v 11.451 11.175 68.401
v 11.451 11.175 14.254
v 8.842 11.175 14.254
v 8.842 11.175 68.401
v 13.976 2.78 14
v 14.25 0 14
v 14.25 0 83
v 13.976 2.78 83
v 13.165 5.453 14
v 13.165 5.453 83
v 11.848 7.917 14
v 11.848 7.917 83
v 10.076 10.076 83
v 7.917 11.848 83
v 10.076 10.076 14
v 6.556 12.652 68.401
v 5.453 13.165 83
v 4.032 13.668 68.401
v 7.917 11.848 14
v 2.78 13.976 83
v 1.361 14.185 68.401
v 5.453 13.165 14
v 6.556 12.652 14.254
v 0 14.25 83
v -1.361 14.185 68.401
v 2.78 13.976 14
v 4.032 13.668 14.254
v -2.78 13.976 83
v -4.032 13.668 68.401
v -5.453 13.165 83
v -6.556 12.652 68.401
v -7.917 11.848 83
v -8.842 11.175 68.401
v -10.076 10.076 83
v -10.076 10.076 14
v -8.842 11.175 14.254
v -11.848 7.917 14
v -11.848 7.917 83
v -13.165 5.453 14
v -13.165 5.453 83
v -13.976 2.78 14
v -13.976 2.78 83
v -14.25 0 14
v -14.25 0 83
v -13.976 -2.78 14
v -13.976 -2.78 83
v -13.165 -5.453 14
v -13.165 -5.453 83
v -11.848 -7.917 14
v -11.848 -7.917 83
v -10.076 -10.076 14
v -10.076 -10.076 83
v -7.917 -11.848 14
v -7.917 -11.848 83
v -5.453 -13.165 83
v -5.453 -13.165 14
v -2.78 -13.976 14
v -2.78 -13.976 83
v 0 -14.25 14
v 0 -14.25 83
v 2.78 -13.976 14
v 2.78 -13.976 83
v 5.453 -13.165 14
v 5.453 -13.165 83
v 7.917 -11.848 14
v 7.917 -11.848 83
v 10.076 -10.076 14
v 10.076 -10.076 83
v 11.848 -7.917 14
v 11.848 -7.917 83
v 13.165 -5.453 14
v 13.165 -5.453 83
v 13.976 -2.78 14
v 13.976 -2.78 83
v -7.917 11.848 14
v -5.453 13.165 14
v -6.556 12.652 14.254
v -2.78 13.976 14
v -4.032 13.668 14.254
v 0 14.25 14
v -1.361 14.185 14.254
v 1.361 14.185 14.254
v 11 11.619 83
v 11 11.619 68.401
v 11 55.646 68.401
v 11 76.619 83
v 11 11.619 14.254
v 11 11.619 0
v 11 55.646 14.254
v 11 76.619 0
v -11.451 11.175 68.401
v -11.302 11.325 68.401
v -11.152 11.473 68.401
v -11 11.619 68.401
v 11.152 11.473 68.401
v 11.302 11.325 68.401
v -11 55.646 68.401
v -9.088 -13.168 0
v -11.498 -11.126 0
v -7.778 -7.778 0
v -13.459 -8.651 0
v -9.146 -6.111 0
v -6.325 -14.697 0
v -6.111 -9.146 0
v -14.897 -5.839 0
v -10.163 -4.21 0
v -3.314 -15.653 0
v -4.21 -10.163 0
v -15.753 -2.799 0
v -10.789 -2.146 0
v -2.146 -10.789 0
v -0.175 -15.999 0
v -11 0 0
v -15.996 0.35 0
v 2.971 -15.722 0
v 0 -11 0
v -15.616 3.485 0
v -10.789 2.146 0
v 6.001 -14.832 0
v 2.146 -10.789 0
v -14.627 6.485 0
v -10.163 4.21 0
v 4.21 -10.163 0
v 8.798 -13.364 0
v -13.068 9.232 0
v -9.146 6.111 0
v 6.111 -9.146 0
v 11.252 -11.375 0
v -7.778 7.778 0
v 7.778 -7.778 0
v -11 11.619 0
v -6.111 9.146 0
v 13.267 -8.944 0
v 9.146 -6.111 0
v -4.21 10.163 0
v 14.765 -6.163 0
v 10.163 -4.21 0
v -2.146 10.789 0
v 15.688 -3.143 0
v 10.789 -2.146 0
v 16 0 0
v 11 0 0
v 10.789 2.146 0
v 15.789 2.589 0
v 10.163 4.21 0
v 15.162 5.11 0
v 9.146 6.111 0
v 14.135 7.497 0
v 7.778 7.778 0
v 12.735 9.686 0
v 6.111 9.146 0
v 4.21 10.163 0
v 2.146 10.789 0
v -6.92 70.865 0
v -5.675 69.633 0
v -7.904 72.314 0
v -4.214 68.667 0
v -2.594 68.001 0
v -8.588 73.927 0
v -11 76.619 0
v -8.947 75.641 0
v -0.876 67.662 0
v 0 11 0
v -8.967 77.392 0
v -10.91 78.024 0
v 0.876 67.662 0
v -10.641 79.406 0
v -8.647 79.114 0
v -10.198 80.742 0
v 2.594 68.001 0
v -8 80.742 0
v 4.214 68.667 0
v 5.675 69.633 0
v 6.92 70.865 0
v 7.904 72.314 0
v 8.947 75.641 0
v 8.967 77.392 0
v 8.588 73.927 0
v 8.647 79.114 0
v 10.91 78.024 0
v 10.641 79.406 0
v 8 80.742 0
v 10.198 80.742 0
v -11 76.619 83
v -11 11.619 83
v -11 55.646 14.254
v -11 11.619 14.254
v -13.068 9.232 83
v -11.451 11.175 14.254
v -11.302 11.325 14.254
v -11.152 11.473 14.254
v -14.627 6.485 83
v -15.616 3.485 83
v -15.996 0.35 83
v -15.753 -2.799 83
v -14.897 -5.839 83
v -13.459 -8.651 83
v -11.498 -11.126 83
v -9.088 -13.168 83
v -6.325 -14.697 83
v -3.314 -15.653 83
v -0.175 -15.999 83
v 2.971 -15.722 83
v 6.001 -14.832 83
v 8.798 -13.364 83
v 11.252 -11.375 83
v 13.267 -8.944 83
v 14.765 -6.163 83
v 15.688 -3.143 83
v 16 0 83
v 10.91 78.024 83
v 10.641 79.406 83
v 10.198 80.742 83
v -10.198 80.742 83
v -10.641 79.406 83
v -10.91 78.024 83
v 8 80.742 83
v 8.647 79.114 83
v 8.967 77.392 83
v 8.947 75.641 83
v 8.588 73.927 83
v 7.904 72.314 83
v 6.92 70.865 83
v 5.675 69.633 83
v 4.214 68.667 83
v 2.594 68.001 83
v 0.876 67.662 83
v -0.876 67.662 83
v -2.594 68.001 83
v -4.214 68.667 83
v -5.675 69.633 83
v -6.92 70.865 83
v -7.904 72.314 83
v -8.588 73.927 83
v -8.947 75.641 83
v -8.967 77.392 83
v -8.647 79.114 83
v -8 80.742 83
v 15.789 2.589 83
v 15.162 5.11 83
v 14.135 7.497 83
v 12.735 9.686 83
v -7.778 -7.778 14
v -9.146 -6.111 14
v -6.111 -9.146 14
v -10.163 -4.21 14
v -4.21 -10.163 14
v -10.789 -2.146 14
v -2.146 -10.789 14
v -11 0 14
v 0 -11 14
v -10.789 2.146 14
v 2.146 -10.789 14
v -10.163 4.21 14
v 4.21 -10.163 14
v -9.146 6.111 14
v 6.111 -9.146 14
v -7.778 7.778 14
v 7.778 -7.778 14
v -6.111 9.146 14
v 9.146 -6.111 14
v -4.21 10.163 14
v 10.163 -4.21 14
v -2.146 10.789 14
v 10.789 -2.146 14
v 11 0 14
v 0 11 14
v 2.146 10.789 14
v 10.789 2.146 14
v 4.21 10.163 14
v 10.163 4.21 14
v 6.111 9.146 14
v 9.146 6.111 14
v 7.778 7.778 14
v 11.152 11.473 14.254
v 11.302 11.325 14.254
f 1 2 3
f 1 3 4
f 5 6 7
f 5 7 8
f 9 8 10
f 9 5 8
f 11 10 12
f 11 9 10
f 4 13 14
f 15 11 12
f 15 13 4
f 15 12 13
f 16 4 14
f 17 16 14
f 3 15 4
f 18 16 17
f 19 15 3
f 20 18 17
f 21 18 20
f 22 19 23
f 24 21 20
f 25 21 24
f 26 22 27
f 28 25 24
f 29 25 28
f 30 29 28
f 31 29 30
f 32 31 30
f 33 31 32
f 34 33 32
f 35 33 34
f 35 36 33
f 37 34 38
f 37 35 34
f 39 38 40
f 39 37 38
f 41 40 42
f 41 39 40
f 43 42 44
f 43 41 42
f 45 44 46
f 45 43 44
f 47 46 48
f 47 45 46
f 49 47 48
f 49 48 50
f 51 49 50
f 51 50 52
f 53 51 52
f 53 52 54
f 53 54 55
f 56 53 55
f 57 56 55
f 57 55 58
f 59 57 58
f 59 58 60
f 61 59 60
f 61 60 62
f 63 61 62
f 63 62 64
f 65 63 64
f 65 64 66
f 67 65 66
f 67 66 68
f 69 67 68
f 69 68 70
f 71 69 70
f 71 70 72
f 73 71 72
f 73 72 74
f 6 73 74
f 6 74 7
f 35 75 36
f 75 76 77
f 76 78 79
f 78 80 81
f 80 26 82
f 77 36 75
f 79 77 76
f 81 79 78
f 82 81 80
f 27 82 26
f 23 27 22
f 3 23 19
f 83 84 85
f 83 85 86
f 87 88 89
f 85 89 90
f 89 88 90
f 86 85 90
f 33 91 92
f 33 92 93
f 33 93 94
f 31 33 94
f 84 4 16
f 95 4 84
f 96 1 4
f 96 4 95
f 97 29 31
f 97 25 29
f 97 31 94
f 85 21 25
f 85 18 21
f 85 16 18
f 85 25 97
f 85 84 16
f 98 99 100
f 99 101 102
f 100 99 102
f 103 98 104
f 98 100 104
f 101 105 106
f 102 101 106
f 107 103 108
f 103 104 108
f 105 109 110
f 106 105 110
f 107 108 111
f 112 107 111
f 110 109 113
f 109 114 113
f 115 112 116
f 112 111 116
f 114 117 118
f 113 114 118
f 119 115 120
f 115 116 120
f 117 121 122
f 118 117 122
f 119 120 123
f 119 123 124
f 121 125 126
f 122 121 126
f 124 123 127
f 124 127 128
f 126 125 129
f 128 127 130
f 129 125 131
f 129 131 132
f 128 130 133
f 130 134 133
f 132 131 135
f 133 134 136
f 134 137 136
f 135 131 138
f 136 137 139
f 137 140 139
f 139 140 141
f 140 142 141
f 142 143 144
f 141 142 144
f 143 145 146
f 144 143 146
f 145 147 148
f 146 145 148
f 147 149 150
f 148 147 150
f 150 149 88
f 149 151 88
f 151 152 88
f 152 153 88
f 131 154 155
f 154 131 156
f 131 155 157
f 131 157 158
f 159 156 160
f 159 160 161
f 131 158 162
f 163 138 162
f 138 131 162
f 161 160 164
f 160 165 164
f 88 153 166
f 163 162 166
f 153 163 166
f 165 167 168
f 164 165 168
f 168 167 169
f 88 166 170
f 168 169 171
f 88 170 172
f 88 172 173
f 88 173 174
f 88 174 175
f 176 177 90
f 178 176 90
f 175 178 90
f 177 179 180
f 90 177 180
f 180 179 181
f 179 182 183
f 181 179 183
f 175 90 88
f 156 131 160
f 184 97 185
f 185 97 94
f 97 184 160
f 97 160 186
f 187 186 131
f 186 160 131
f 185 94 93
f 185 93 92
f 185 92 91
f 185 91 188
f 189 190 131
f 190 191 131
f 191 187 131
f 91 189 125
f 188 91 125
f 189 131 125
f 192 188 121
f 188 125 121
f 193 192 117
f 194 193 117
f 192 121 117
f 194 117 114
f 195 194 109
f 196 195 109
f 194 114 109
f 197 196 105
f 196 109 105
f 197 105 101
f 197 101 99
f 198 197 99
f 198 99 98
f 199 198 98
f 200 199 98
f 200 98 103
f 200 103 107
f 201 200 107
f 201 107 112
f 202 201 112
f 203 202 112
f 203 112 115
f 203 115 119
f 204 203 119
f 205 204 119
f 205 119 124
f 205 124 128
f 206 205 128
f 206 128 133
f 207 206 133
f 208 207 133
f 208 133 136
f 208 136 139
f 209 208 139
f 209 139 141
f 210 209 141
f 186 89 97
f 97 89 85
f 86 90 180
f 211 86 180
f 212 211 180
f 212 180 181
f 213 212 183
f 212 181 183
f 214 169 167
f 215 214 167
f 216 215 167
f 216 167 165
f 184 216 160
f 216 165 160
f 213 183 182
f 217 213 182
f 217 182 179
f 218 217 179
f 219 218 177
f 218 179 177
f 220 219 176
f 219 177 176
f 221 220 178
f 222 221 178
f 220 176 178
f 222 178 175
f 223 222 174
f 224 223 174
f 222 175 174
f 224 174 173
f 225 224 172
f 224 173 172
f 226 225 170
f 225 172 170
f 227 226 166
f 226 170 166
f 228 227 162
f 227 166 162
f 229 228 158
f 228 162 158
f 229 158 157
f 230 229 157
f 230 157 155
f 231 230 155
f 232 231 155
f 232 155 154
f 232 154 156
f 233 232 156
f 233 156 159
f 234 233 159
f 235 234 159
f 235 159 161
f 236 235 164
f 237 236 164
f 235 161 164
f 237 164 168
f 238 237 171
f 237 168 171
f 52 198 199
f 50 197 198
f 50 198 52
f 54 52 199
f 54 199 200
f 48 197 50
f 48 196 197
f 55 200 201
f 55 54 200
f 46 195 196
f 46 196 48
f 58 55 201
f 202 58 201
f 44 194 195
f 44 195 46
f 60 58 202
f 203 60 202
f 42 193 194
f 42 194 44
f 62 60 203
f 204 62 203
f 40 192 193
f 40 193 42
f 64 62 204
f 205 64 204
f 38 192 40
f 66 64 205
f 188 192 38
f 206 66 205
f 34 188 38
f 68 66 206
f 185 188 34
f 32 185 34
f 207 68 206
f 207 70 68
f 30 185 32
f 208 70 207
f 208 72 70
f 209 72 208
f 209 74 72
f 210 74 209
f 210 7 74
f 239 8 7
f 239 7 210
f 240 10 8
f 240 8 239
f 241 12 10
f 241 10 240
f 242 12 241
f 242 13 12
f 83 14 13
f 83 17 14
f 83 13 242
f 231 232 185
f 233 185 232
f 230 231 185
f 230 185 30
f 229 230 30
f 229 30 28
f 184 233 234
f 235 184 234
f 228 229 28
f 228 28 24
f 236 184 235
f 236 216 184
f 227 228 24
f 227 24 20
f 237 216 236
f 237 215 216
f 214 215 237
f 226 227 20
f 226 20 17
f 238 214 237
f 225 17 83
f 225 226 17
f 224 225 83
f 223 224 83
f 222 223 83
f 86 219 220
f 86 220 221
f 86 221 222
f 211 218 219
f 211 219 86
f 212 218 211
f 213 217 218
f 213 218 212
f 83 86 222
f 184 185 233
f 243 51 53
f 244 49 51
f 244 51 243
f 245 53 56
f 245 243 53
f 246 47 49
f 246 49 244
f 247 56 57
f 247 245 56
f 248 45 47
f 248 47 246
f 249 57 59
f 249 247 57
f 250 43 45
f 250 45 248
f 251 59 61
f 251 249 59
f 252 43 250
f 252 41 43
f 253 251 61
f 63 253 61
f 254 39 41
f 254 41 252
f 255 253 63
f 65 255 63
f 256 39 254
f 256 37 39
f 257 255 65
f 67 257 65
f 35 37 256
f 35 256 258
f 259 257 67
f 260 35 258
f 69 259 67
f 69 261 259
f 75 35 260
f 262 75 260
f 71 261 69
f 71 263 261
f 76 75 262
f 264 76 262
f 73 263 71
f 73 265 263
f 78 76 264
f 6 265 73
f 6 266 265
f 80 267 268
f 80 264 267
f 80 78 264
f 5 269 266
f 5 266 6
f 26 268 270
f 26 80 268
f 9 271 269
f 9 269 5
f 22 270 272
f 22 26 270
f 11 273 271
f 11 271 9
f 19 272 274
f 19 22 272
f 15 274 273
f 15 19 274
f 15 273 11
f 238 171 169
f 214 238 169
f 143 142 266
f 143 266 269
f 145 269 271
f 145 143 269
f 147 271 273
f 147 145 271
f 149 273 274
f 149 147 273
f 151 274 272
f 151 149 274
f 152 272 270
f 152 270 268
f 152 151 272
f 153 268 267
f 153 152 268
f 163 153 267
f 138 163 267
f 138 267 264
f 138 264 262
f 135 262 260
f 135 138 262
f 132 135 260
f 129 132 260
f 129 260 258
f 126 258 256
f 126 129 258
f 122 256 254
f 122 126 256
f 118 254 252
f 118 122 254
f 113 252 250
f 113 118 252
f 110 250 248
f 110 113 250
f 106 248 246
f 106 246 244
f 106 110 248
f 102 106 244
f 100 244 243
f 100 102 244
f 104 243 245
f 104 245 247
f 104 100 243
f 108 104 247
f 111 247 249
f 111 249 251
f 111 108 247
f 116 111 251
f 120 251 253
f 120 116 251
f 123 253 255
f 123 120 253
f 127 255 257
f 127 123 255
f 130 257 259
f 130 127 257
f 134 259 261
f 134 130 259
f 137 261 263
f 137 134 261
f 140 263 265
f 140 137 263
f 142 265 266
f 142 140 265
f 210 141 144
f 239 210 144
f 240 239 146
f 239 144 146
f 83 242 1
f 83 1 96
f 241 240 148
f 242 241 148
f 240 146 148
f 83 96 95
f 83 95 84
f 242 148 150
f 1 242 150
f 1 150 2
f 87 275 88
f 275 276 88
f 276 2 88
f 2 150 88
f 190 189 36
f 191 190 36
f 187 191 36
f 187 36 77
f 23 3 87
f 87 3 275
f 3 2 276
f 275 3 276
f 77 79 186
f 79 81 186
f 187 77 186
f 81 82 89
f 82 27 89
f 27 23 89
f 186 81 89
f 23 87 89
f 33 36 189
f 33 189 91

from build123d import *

# Parameters (mm, degrees)
F0_R     = 14.25
F1_DEPTH = 83
F2_W     = 44.470418
F2_H     = 54.147916
F3_DEPTH = 12.5
F4_R     = 14.971262
F4_R_2   = 11
F5_DEPTH = 14


with BuildPart() as f1:
    # F0 (on Top) → F1 (new body)
    with BuildSketch(Plane.XY):
        with BuildLine():
            ThreePointArc((-11, 11.61895), (-6.324555, -14.696938), (16, 0))
            ThreePointArc((16, 0), (14.696938, 6.324555), (11, 11.61895))
            ThreePointArc((11, 11.61895), (0, 16), (-11, 11.61895))
        make_face()
        Circle(F0_R, mode=Mode.SUBTRACT)
        with BuildLine():
            ThreePointArc((-11, 76.61895), (0, 65.61895), (11, 76.61895))
            ThreePointArc((11, 76.61895), (10.797649, 78.719137), (10.198039, 80.742056))
            Line((10.198039, 80.742056), (8, 80.742056))
            ThreePointArc((8, 80.742056), (0, 67.61895), (-8, 80.742056))
            Line((-8, 80.742056), (-10.198039, 80.742056))
            ThreePointArc((-10.198039, 80.742056), (-10.797649, 78.719137), (-11, 76.61895))
        make_face()
        with BuildLine():
            ThreePointArc((-11, 11.61895), (0, 16), (11, 11.61895))
            Line((11, 11.61895), (11, 76.61895))
            ThreePointArc((11, 76.61895), (0, 65.61895), (-11, 76.61895))
            Line((-11, 76.61895), (-11, 11.61895))
        make_face()
    extrude(amount=F1_DEPTH)

    # F2 (on Right) → F3 (cut, symmetric)
    with BuildSketch(Plane.YZ):
        with Locations((33.410417, 41.327498)):
            Rectangle(F2_W, F2_H)
    extrude(amount=F3_DEPTH, both=True, mode=Mode.SUBTRACT)

    # F4 (on Top) → F5 (join)
    with BuildSketch(Plane.XY):
        Circle(F4_R)
        Circle(F4_R_2, mode=Mode.SUBTRACT)
    extrude(amount=F5_DEPTH)


solid = f1.part
